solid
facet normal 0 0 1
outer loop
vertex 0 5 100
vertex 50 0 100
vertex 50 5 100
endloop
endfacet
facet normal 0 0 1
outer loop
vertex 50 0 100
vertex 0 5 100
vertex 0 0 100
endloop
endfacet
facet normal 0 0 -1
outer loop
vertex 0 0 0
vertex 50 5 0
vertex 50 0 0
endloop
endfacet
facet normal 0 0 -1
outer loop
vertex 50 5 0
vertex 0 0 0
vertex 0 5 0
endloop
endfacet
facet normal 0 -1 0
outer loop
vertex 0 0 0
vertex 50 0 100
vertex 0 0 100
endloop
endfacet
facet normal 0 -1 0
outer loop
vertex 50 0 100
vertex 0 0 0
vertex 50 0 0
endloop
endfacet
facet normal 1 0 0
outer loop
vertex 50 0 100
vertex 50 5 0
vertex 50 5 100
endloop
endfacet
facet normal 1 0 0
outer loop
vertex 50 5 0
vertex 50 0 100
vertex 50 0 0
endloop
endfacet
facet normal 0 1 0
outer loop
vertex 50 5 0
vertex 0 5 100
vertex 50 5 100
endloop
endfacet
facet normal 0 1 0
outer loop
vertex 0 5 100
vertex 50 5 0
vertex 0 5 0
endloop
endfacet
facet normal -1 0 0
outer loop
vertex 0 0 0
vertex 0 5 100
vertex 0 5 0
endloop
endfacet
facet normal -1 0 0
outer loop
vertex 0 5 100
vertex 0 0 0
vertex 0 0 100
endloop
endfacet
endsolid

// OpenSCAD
// Create a strip that we can print and test the SLA printer with.

WIDTH =   50; // mm
HEIGHT = 100; // mm
DEPTH =    5; // mm

cube([WIDTH, DEPTH, HEIGHT]);
